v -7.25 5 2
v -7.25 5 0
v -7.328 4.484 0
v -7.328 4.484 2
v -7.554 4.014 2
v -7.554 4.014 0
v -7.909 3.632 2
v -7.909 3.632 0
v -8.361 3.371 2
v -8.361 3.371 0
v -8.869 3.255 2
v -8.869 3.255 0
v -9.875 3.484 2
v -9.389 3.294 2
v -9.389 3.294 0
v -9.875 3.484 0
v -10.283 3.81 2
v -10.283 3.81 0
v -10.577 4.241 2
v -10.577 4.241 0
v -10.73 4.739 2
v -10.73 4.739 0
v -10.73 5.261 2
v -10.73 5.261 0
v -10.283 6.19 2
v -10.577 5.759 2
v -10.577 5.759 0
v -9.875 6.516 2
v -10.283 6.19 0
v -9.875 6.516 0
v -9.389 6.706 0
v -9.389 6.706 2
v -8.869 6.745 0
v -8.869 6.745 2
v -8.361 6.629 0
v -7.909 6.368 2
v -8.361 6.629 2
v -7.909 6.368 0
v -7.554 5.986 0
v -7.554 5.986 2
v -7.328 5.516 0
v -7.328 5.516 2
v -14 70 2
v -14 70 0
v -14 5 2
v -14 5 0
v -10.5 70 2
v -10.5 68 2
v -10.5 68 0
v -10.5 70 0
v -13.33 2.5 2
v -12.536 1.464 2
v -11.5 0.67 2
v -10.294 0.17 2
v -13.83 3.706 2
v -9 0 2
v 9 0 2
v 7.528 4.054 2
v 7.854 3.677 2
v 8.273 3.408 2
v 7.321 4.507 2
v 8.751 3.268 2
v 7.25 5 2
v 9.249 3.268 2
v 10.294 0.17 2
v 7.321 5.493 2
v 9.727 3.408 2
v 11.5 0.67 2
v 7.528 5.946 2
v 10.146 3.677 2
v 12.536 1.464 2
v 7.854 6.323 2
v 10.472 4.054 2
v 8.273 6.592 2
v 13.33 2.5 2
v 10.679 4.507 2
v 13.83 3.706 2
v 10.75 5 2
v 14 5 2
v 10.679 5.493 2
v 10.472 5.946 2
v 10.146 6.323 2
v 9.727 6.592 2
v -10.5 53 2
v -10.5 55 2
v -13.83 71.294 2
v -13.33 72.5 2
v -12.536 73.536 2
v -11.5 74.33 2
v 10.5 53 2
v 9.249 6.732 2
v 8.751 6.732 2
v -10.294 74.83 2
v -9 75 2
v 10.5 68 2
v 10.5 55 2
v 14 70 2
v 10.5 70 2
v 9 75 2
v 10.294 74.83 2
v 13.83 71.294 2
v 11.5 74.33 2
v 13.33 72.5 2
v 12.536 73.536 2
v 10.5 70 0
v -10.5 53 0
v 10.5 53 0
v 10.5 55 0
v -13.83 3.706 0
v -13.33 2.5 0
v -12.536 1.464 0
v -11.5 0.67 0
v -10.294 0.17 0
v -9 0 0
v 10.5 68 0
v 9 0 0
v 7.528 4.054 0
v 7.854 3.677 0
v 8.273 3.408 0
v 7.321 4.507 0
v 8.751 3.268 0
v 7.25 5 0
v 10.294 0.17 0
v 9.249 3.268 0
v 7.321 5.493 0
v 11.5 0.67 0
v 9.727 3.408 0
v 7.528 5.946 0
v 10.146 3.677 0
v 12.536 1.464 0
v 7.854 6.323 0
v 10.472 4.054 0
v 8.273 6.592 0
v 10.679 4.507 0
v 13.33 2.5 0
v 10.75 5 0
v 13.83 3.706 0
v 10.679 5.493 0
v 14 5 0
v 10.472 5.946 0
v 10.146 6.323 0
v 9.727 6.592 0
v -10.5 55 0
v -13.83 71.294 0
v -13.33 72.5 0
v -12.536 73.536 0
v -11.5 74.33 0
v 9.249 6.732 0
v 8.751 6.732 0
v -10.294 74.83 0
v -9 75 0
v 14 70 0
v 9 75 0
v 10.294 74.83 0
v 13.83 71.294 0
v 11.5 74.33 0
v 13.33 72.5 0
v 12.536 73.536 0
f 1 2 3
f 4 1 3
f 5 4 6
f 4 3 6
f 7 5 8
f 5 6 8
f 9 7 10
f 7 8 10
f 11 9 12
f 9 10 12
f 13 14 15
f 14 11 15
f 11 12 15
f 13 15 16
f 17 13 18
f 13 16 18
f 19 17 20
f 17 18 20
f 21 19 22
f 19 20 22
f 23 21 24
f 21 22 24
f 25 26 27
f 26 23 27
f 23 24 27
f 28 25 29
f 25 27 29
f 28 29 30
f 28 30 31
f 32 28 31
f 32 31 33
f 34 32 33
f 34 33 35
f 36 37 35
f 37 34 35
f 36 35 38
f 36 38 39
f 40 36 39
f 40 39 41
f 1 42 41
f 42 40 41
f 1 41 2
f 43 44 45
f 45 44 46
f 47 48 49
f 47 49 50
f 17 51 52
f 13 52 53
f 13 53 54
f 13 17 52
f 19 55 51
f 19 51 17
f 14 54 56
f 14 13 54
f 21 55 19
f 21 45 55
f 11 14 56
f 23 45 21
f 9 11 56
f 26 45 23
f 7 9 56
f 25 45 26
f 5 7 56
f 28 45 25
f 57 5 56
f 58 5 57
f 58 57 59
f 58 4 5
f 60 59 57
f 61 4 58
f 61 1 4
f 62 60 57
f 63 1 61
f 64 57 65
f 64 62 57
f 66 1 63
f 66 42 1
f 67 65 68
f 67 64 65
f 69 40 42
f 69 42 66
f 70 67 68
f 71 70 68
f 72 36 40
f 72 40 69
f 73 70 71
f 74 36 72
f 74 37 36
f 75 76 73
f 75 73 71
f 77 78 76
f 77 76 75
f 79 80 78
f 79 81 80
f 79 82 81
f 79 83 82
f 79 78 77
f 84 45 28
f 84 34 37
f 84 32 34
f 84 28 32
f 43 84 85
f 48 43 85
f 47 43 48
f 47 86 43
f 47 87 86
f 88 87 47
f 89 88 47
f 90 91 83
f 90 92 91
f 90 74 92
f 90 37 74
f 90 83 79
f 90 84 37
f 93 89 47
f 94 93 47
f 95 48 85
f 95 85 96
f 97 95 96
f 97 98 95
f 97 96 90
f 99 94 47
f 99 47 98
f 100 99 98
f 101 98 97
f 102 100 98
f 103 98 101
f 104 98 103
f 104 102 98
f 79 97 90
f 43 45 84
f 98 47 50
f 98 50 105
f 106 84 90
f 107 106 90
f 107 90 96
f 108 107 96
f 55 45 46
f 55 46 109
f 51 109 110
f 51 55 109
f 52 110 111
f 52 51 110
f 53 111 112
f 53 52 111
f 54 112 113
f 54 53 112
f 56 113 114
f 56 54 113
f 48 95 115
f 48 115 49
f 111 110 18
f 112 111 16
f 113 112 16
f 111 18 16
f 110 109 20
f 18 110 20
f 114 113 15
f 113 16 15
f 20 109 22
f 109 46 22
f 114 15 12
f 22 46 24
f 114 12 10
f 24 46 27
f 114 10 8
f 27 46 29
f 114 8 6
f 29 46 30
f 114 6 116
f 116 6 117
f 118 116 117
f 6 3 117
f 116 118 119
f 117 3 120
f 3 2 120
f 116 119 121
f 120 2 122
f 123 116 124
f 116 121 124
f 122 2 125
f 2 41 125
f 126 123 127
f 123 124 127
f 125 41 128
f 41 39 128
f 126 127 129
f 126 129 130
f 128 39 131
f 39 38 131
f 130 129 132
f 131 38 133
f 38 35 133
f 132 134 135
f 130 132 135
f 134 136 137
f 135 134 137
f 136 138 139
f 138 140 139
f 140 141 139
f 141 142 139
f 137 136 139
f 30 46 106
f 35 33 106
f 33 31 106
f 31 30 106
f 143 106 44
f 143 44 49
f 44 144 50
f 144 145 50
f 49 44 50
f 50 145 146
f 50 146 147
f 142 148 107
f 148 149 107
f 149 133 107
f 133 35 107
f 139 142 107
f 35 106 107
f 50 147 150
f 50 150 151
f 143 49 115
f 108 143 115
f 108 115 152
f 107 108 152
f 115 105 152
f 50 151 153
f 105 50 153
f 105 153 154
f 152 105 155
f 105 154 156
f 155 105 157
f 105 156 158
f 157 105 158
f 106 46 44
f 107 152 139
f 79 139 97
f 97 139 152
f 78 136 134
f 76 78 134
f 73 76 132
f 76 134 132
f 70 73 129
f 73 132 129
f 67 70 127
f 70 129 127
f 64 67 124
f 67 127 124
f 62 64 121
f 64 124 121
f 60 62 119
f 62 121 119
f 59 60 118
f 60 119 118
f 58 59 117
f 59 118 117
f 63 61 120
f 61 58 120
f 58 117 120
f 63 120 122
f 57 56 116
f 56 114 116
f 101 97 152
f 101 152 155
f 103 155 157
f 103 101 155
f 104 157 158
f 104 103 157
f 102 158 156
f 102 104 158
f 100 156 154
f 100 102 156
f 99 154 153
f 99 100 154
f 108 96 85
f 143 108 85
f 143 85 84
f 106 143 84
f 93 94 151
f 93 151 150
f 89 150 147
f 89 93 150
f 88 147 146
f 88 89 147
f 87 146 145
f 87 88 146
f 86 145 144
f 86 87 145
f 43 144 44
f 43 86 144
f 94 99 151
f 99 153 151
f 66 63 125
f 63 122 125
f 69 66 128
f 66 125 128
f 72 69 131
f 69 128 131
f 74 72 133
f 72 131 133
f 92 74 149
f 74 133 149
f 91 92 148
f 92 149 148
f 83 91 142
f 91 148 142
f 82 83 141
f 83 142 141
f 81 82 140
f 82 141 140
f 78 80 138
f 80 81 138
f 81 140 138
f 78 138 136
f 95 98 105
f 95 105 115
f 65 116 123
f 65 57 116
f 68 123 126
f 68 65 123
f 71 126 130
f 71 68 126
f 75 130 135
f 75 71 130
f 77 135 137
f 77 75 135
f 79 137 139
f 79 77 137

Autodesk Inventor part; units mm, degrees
ref_plane "YZ Plane" through (0, 0, 0) normal (1, 0, 0) x (0, 1, 0)
ref_plane "XZ Plane" through (0, 0, 0) normal (0, 1, 0) x (-1, 0, 0)
ref_plane "XY Plane" through (0, 0, 0) normal (0, 0, 1) x (1, 0, 0)
sketch "Sketch1" plane through (0, 0, 0) normal (0, 0, 1) x (1, 0, 0)
  line L0 (-14, 0) -> (14, 0)
  line L1 (14, 0) -> (14, 75)
  line L2 (14, 75) -> (-14, 75)
  line L3 (-14, 75) -> (-14, 0)
  circle A0 centre (-9, 5) radius 1.75
  circle A1 centre (9, 5) radius 1.75
  line L4 (-9, 5) -> (9, 5)
  point P0 (0, 0)
  point P1 (0, 0)
  point P2 (0, 5)
  dimension "d0" = 75
  dimension "d2" = 28
  dimension "d3" = 5
  dimension "d4" = 3.5
  dimension "d5" = 18
extrude "Extrusion1" add sketch "Sketch1" along normal blind 2
sketch "Sketch4" plane through (0, 0, 2) normal (0, 0, 1) x (1, 0, 0)
  line L0 (14, 75) -> (-14, 75) projected
  line L1 (-10.5, 70) -> (10.5, 70)
  line L2 (10.5, 70) -> (10.5, 68)
  line L3 (10.5, 68) -> (-10.5, 68)
  line L4 (-10.5, 68) -> (-10.5, 70)
  line L5 (-10.5, 53) -> (10.5, 53)
  line L6 (10.5, 53) -> (10.5, 55)
  line L7 (10.5, 55) -> (-10.5, 55)
  line L8 (-10.5, 55) -> (-10.5, 53)
  point P0 (0, 0)
  point P1 (0, 53)
  point P2 (0, 68)
  point P3 (0, 75)
  dimension "d19" = 21
  dimension "d21" = 2
  dimension "d22" = 5
  dimension "d23" = 15
extrude "Extrusion4" cut sketch "Sketch4" against normal through all
fillet "Fillet2" radius 5 4 edges at (14, 75, 1) (-14, 75, 1) (14, 0, 1) (-14, 0, 1)
sketch "Sketch2" plane through (0, 0, 2) normal (0, 0, 1) x (1, 0, 0)
  line L0 (14, 75) -> (-14, 75) projected
  line L1 (-11, 75) -> (11, 75)
  line L2 (11, 75) -> (11, 65)
  line L3 (11, 65) -> (-11, 65)
  line L4 (-11, 65) -> (-11, 75)
  line L5 (-11, 65) -> (-14, 65)
  line L6 (-14, 65) -> (-14, 75)
  line L7 (-14, 75) -> (-11, 75)
  line L8 (-11, 75) -> (-11, 65)
  line L9 (11, 65) -> (14, 65)
  line L10 (14, 65) -> (14, 75)
  line L11 (14, 75) -> (11, 75)
  line L12 (11, 75) -> (11, 65)
  point P0 (0, 0)
  point P1 (0, 75)
  dimension "d8" = 10
  dimension "d10" = 22
sketch "Sketch3" plane through (0, 0, 4) normal (0, 0, 1) x (1, 0, 0)
  line L0 (-11, 65) -> (-11, 75) projected
  line L1 (-11, 75) -> (-14, 75) projected
  line L2 (-14, 75) -> (-14, 65) projected
  line L3 (-14, 65) -> (-11, 65) projected
  line L4 (14, 75) -> (11, 75) projected
  line L5 (11, 75) -> (11, 65) projected
  line L6 (11, 65) -> (14, 65) projected
  line L7 (14, 65) -> (14, 75) projected
  line L8 (-11, 75) -> (11, 75)
  line L9 (11, 75) -> (11, 65)
  line L10 (11, 65) -> (-11, 65)
  line L11 (-11, 65) -> (-11, 75)
  point P0 (0, 0)
properties part number "ribbon slider manager"
